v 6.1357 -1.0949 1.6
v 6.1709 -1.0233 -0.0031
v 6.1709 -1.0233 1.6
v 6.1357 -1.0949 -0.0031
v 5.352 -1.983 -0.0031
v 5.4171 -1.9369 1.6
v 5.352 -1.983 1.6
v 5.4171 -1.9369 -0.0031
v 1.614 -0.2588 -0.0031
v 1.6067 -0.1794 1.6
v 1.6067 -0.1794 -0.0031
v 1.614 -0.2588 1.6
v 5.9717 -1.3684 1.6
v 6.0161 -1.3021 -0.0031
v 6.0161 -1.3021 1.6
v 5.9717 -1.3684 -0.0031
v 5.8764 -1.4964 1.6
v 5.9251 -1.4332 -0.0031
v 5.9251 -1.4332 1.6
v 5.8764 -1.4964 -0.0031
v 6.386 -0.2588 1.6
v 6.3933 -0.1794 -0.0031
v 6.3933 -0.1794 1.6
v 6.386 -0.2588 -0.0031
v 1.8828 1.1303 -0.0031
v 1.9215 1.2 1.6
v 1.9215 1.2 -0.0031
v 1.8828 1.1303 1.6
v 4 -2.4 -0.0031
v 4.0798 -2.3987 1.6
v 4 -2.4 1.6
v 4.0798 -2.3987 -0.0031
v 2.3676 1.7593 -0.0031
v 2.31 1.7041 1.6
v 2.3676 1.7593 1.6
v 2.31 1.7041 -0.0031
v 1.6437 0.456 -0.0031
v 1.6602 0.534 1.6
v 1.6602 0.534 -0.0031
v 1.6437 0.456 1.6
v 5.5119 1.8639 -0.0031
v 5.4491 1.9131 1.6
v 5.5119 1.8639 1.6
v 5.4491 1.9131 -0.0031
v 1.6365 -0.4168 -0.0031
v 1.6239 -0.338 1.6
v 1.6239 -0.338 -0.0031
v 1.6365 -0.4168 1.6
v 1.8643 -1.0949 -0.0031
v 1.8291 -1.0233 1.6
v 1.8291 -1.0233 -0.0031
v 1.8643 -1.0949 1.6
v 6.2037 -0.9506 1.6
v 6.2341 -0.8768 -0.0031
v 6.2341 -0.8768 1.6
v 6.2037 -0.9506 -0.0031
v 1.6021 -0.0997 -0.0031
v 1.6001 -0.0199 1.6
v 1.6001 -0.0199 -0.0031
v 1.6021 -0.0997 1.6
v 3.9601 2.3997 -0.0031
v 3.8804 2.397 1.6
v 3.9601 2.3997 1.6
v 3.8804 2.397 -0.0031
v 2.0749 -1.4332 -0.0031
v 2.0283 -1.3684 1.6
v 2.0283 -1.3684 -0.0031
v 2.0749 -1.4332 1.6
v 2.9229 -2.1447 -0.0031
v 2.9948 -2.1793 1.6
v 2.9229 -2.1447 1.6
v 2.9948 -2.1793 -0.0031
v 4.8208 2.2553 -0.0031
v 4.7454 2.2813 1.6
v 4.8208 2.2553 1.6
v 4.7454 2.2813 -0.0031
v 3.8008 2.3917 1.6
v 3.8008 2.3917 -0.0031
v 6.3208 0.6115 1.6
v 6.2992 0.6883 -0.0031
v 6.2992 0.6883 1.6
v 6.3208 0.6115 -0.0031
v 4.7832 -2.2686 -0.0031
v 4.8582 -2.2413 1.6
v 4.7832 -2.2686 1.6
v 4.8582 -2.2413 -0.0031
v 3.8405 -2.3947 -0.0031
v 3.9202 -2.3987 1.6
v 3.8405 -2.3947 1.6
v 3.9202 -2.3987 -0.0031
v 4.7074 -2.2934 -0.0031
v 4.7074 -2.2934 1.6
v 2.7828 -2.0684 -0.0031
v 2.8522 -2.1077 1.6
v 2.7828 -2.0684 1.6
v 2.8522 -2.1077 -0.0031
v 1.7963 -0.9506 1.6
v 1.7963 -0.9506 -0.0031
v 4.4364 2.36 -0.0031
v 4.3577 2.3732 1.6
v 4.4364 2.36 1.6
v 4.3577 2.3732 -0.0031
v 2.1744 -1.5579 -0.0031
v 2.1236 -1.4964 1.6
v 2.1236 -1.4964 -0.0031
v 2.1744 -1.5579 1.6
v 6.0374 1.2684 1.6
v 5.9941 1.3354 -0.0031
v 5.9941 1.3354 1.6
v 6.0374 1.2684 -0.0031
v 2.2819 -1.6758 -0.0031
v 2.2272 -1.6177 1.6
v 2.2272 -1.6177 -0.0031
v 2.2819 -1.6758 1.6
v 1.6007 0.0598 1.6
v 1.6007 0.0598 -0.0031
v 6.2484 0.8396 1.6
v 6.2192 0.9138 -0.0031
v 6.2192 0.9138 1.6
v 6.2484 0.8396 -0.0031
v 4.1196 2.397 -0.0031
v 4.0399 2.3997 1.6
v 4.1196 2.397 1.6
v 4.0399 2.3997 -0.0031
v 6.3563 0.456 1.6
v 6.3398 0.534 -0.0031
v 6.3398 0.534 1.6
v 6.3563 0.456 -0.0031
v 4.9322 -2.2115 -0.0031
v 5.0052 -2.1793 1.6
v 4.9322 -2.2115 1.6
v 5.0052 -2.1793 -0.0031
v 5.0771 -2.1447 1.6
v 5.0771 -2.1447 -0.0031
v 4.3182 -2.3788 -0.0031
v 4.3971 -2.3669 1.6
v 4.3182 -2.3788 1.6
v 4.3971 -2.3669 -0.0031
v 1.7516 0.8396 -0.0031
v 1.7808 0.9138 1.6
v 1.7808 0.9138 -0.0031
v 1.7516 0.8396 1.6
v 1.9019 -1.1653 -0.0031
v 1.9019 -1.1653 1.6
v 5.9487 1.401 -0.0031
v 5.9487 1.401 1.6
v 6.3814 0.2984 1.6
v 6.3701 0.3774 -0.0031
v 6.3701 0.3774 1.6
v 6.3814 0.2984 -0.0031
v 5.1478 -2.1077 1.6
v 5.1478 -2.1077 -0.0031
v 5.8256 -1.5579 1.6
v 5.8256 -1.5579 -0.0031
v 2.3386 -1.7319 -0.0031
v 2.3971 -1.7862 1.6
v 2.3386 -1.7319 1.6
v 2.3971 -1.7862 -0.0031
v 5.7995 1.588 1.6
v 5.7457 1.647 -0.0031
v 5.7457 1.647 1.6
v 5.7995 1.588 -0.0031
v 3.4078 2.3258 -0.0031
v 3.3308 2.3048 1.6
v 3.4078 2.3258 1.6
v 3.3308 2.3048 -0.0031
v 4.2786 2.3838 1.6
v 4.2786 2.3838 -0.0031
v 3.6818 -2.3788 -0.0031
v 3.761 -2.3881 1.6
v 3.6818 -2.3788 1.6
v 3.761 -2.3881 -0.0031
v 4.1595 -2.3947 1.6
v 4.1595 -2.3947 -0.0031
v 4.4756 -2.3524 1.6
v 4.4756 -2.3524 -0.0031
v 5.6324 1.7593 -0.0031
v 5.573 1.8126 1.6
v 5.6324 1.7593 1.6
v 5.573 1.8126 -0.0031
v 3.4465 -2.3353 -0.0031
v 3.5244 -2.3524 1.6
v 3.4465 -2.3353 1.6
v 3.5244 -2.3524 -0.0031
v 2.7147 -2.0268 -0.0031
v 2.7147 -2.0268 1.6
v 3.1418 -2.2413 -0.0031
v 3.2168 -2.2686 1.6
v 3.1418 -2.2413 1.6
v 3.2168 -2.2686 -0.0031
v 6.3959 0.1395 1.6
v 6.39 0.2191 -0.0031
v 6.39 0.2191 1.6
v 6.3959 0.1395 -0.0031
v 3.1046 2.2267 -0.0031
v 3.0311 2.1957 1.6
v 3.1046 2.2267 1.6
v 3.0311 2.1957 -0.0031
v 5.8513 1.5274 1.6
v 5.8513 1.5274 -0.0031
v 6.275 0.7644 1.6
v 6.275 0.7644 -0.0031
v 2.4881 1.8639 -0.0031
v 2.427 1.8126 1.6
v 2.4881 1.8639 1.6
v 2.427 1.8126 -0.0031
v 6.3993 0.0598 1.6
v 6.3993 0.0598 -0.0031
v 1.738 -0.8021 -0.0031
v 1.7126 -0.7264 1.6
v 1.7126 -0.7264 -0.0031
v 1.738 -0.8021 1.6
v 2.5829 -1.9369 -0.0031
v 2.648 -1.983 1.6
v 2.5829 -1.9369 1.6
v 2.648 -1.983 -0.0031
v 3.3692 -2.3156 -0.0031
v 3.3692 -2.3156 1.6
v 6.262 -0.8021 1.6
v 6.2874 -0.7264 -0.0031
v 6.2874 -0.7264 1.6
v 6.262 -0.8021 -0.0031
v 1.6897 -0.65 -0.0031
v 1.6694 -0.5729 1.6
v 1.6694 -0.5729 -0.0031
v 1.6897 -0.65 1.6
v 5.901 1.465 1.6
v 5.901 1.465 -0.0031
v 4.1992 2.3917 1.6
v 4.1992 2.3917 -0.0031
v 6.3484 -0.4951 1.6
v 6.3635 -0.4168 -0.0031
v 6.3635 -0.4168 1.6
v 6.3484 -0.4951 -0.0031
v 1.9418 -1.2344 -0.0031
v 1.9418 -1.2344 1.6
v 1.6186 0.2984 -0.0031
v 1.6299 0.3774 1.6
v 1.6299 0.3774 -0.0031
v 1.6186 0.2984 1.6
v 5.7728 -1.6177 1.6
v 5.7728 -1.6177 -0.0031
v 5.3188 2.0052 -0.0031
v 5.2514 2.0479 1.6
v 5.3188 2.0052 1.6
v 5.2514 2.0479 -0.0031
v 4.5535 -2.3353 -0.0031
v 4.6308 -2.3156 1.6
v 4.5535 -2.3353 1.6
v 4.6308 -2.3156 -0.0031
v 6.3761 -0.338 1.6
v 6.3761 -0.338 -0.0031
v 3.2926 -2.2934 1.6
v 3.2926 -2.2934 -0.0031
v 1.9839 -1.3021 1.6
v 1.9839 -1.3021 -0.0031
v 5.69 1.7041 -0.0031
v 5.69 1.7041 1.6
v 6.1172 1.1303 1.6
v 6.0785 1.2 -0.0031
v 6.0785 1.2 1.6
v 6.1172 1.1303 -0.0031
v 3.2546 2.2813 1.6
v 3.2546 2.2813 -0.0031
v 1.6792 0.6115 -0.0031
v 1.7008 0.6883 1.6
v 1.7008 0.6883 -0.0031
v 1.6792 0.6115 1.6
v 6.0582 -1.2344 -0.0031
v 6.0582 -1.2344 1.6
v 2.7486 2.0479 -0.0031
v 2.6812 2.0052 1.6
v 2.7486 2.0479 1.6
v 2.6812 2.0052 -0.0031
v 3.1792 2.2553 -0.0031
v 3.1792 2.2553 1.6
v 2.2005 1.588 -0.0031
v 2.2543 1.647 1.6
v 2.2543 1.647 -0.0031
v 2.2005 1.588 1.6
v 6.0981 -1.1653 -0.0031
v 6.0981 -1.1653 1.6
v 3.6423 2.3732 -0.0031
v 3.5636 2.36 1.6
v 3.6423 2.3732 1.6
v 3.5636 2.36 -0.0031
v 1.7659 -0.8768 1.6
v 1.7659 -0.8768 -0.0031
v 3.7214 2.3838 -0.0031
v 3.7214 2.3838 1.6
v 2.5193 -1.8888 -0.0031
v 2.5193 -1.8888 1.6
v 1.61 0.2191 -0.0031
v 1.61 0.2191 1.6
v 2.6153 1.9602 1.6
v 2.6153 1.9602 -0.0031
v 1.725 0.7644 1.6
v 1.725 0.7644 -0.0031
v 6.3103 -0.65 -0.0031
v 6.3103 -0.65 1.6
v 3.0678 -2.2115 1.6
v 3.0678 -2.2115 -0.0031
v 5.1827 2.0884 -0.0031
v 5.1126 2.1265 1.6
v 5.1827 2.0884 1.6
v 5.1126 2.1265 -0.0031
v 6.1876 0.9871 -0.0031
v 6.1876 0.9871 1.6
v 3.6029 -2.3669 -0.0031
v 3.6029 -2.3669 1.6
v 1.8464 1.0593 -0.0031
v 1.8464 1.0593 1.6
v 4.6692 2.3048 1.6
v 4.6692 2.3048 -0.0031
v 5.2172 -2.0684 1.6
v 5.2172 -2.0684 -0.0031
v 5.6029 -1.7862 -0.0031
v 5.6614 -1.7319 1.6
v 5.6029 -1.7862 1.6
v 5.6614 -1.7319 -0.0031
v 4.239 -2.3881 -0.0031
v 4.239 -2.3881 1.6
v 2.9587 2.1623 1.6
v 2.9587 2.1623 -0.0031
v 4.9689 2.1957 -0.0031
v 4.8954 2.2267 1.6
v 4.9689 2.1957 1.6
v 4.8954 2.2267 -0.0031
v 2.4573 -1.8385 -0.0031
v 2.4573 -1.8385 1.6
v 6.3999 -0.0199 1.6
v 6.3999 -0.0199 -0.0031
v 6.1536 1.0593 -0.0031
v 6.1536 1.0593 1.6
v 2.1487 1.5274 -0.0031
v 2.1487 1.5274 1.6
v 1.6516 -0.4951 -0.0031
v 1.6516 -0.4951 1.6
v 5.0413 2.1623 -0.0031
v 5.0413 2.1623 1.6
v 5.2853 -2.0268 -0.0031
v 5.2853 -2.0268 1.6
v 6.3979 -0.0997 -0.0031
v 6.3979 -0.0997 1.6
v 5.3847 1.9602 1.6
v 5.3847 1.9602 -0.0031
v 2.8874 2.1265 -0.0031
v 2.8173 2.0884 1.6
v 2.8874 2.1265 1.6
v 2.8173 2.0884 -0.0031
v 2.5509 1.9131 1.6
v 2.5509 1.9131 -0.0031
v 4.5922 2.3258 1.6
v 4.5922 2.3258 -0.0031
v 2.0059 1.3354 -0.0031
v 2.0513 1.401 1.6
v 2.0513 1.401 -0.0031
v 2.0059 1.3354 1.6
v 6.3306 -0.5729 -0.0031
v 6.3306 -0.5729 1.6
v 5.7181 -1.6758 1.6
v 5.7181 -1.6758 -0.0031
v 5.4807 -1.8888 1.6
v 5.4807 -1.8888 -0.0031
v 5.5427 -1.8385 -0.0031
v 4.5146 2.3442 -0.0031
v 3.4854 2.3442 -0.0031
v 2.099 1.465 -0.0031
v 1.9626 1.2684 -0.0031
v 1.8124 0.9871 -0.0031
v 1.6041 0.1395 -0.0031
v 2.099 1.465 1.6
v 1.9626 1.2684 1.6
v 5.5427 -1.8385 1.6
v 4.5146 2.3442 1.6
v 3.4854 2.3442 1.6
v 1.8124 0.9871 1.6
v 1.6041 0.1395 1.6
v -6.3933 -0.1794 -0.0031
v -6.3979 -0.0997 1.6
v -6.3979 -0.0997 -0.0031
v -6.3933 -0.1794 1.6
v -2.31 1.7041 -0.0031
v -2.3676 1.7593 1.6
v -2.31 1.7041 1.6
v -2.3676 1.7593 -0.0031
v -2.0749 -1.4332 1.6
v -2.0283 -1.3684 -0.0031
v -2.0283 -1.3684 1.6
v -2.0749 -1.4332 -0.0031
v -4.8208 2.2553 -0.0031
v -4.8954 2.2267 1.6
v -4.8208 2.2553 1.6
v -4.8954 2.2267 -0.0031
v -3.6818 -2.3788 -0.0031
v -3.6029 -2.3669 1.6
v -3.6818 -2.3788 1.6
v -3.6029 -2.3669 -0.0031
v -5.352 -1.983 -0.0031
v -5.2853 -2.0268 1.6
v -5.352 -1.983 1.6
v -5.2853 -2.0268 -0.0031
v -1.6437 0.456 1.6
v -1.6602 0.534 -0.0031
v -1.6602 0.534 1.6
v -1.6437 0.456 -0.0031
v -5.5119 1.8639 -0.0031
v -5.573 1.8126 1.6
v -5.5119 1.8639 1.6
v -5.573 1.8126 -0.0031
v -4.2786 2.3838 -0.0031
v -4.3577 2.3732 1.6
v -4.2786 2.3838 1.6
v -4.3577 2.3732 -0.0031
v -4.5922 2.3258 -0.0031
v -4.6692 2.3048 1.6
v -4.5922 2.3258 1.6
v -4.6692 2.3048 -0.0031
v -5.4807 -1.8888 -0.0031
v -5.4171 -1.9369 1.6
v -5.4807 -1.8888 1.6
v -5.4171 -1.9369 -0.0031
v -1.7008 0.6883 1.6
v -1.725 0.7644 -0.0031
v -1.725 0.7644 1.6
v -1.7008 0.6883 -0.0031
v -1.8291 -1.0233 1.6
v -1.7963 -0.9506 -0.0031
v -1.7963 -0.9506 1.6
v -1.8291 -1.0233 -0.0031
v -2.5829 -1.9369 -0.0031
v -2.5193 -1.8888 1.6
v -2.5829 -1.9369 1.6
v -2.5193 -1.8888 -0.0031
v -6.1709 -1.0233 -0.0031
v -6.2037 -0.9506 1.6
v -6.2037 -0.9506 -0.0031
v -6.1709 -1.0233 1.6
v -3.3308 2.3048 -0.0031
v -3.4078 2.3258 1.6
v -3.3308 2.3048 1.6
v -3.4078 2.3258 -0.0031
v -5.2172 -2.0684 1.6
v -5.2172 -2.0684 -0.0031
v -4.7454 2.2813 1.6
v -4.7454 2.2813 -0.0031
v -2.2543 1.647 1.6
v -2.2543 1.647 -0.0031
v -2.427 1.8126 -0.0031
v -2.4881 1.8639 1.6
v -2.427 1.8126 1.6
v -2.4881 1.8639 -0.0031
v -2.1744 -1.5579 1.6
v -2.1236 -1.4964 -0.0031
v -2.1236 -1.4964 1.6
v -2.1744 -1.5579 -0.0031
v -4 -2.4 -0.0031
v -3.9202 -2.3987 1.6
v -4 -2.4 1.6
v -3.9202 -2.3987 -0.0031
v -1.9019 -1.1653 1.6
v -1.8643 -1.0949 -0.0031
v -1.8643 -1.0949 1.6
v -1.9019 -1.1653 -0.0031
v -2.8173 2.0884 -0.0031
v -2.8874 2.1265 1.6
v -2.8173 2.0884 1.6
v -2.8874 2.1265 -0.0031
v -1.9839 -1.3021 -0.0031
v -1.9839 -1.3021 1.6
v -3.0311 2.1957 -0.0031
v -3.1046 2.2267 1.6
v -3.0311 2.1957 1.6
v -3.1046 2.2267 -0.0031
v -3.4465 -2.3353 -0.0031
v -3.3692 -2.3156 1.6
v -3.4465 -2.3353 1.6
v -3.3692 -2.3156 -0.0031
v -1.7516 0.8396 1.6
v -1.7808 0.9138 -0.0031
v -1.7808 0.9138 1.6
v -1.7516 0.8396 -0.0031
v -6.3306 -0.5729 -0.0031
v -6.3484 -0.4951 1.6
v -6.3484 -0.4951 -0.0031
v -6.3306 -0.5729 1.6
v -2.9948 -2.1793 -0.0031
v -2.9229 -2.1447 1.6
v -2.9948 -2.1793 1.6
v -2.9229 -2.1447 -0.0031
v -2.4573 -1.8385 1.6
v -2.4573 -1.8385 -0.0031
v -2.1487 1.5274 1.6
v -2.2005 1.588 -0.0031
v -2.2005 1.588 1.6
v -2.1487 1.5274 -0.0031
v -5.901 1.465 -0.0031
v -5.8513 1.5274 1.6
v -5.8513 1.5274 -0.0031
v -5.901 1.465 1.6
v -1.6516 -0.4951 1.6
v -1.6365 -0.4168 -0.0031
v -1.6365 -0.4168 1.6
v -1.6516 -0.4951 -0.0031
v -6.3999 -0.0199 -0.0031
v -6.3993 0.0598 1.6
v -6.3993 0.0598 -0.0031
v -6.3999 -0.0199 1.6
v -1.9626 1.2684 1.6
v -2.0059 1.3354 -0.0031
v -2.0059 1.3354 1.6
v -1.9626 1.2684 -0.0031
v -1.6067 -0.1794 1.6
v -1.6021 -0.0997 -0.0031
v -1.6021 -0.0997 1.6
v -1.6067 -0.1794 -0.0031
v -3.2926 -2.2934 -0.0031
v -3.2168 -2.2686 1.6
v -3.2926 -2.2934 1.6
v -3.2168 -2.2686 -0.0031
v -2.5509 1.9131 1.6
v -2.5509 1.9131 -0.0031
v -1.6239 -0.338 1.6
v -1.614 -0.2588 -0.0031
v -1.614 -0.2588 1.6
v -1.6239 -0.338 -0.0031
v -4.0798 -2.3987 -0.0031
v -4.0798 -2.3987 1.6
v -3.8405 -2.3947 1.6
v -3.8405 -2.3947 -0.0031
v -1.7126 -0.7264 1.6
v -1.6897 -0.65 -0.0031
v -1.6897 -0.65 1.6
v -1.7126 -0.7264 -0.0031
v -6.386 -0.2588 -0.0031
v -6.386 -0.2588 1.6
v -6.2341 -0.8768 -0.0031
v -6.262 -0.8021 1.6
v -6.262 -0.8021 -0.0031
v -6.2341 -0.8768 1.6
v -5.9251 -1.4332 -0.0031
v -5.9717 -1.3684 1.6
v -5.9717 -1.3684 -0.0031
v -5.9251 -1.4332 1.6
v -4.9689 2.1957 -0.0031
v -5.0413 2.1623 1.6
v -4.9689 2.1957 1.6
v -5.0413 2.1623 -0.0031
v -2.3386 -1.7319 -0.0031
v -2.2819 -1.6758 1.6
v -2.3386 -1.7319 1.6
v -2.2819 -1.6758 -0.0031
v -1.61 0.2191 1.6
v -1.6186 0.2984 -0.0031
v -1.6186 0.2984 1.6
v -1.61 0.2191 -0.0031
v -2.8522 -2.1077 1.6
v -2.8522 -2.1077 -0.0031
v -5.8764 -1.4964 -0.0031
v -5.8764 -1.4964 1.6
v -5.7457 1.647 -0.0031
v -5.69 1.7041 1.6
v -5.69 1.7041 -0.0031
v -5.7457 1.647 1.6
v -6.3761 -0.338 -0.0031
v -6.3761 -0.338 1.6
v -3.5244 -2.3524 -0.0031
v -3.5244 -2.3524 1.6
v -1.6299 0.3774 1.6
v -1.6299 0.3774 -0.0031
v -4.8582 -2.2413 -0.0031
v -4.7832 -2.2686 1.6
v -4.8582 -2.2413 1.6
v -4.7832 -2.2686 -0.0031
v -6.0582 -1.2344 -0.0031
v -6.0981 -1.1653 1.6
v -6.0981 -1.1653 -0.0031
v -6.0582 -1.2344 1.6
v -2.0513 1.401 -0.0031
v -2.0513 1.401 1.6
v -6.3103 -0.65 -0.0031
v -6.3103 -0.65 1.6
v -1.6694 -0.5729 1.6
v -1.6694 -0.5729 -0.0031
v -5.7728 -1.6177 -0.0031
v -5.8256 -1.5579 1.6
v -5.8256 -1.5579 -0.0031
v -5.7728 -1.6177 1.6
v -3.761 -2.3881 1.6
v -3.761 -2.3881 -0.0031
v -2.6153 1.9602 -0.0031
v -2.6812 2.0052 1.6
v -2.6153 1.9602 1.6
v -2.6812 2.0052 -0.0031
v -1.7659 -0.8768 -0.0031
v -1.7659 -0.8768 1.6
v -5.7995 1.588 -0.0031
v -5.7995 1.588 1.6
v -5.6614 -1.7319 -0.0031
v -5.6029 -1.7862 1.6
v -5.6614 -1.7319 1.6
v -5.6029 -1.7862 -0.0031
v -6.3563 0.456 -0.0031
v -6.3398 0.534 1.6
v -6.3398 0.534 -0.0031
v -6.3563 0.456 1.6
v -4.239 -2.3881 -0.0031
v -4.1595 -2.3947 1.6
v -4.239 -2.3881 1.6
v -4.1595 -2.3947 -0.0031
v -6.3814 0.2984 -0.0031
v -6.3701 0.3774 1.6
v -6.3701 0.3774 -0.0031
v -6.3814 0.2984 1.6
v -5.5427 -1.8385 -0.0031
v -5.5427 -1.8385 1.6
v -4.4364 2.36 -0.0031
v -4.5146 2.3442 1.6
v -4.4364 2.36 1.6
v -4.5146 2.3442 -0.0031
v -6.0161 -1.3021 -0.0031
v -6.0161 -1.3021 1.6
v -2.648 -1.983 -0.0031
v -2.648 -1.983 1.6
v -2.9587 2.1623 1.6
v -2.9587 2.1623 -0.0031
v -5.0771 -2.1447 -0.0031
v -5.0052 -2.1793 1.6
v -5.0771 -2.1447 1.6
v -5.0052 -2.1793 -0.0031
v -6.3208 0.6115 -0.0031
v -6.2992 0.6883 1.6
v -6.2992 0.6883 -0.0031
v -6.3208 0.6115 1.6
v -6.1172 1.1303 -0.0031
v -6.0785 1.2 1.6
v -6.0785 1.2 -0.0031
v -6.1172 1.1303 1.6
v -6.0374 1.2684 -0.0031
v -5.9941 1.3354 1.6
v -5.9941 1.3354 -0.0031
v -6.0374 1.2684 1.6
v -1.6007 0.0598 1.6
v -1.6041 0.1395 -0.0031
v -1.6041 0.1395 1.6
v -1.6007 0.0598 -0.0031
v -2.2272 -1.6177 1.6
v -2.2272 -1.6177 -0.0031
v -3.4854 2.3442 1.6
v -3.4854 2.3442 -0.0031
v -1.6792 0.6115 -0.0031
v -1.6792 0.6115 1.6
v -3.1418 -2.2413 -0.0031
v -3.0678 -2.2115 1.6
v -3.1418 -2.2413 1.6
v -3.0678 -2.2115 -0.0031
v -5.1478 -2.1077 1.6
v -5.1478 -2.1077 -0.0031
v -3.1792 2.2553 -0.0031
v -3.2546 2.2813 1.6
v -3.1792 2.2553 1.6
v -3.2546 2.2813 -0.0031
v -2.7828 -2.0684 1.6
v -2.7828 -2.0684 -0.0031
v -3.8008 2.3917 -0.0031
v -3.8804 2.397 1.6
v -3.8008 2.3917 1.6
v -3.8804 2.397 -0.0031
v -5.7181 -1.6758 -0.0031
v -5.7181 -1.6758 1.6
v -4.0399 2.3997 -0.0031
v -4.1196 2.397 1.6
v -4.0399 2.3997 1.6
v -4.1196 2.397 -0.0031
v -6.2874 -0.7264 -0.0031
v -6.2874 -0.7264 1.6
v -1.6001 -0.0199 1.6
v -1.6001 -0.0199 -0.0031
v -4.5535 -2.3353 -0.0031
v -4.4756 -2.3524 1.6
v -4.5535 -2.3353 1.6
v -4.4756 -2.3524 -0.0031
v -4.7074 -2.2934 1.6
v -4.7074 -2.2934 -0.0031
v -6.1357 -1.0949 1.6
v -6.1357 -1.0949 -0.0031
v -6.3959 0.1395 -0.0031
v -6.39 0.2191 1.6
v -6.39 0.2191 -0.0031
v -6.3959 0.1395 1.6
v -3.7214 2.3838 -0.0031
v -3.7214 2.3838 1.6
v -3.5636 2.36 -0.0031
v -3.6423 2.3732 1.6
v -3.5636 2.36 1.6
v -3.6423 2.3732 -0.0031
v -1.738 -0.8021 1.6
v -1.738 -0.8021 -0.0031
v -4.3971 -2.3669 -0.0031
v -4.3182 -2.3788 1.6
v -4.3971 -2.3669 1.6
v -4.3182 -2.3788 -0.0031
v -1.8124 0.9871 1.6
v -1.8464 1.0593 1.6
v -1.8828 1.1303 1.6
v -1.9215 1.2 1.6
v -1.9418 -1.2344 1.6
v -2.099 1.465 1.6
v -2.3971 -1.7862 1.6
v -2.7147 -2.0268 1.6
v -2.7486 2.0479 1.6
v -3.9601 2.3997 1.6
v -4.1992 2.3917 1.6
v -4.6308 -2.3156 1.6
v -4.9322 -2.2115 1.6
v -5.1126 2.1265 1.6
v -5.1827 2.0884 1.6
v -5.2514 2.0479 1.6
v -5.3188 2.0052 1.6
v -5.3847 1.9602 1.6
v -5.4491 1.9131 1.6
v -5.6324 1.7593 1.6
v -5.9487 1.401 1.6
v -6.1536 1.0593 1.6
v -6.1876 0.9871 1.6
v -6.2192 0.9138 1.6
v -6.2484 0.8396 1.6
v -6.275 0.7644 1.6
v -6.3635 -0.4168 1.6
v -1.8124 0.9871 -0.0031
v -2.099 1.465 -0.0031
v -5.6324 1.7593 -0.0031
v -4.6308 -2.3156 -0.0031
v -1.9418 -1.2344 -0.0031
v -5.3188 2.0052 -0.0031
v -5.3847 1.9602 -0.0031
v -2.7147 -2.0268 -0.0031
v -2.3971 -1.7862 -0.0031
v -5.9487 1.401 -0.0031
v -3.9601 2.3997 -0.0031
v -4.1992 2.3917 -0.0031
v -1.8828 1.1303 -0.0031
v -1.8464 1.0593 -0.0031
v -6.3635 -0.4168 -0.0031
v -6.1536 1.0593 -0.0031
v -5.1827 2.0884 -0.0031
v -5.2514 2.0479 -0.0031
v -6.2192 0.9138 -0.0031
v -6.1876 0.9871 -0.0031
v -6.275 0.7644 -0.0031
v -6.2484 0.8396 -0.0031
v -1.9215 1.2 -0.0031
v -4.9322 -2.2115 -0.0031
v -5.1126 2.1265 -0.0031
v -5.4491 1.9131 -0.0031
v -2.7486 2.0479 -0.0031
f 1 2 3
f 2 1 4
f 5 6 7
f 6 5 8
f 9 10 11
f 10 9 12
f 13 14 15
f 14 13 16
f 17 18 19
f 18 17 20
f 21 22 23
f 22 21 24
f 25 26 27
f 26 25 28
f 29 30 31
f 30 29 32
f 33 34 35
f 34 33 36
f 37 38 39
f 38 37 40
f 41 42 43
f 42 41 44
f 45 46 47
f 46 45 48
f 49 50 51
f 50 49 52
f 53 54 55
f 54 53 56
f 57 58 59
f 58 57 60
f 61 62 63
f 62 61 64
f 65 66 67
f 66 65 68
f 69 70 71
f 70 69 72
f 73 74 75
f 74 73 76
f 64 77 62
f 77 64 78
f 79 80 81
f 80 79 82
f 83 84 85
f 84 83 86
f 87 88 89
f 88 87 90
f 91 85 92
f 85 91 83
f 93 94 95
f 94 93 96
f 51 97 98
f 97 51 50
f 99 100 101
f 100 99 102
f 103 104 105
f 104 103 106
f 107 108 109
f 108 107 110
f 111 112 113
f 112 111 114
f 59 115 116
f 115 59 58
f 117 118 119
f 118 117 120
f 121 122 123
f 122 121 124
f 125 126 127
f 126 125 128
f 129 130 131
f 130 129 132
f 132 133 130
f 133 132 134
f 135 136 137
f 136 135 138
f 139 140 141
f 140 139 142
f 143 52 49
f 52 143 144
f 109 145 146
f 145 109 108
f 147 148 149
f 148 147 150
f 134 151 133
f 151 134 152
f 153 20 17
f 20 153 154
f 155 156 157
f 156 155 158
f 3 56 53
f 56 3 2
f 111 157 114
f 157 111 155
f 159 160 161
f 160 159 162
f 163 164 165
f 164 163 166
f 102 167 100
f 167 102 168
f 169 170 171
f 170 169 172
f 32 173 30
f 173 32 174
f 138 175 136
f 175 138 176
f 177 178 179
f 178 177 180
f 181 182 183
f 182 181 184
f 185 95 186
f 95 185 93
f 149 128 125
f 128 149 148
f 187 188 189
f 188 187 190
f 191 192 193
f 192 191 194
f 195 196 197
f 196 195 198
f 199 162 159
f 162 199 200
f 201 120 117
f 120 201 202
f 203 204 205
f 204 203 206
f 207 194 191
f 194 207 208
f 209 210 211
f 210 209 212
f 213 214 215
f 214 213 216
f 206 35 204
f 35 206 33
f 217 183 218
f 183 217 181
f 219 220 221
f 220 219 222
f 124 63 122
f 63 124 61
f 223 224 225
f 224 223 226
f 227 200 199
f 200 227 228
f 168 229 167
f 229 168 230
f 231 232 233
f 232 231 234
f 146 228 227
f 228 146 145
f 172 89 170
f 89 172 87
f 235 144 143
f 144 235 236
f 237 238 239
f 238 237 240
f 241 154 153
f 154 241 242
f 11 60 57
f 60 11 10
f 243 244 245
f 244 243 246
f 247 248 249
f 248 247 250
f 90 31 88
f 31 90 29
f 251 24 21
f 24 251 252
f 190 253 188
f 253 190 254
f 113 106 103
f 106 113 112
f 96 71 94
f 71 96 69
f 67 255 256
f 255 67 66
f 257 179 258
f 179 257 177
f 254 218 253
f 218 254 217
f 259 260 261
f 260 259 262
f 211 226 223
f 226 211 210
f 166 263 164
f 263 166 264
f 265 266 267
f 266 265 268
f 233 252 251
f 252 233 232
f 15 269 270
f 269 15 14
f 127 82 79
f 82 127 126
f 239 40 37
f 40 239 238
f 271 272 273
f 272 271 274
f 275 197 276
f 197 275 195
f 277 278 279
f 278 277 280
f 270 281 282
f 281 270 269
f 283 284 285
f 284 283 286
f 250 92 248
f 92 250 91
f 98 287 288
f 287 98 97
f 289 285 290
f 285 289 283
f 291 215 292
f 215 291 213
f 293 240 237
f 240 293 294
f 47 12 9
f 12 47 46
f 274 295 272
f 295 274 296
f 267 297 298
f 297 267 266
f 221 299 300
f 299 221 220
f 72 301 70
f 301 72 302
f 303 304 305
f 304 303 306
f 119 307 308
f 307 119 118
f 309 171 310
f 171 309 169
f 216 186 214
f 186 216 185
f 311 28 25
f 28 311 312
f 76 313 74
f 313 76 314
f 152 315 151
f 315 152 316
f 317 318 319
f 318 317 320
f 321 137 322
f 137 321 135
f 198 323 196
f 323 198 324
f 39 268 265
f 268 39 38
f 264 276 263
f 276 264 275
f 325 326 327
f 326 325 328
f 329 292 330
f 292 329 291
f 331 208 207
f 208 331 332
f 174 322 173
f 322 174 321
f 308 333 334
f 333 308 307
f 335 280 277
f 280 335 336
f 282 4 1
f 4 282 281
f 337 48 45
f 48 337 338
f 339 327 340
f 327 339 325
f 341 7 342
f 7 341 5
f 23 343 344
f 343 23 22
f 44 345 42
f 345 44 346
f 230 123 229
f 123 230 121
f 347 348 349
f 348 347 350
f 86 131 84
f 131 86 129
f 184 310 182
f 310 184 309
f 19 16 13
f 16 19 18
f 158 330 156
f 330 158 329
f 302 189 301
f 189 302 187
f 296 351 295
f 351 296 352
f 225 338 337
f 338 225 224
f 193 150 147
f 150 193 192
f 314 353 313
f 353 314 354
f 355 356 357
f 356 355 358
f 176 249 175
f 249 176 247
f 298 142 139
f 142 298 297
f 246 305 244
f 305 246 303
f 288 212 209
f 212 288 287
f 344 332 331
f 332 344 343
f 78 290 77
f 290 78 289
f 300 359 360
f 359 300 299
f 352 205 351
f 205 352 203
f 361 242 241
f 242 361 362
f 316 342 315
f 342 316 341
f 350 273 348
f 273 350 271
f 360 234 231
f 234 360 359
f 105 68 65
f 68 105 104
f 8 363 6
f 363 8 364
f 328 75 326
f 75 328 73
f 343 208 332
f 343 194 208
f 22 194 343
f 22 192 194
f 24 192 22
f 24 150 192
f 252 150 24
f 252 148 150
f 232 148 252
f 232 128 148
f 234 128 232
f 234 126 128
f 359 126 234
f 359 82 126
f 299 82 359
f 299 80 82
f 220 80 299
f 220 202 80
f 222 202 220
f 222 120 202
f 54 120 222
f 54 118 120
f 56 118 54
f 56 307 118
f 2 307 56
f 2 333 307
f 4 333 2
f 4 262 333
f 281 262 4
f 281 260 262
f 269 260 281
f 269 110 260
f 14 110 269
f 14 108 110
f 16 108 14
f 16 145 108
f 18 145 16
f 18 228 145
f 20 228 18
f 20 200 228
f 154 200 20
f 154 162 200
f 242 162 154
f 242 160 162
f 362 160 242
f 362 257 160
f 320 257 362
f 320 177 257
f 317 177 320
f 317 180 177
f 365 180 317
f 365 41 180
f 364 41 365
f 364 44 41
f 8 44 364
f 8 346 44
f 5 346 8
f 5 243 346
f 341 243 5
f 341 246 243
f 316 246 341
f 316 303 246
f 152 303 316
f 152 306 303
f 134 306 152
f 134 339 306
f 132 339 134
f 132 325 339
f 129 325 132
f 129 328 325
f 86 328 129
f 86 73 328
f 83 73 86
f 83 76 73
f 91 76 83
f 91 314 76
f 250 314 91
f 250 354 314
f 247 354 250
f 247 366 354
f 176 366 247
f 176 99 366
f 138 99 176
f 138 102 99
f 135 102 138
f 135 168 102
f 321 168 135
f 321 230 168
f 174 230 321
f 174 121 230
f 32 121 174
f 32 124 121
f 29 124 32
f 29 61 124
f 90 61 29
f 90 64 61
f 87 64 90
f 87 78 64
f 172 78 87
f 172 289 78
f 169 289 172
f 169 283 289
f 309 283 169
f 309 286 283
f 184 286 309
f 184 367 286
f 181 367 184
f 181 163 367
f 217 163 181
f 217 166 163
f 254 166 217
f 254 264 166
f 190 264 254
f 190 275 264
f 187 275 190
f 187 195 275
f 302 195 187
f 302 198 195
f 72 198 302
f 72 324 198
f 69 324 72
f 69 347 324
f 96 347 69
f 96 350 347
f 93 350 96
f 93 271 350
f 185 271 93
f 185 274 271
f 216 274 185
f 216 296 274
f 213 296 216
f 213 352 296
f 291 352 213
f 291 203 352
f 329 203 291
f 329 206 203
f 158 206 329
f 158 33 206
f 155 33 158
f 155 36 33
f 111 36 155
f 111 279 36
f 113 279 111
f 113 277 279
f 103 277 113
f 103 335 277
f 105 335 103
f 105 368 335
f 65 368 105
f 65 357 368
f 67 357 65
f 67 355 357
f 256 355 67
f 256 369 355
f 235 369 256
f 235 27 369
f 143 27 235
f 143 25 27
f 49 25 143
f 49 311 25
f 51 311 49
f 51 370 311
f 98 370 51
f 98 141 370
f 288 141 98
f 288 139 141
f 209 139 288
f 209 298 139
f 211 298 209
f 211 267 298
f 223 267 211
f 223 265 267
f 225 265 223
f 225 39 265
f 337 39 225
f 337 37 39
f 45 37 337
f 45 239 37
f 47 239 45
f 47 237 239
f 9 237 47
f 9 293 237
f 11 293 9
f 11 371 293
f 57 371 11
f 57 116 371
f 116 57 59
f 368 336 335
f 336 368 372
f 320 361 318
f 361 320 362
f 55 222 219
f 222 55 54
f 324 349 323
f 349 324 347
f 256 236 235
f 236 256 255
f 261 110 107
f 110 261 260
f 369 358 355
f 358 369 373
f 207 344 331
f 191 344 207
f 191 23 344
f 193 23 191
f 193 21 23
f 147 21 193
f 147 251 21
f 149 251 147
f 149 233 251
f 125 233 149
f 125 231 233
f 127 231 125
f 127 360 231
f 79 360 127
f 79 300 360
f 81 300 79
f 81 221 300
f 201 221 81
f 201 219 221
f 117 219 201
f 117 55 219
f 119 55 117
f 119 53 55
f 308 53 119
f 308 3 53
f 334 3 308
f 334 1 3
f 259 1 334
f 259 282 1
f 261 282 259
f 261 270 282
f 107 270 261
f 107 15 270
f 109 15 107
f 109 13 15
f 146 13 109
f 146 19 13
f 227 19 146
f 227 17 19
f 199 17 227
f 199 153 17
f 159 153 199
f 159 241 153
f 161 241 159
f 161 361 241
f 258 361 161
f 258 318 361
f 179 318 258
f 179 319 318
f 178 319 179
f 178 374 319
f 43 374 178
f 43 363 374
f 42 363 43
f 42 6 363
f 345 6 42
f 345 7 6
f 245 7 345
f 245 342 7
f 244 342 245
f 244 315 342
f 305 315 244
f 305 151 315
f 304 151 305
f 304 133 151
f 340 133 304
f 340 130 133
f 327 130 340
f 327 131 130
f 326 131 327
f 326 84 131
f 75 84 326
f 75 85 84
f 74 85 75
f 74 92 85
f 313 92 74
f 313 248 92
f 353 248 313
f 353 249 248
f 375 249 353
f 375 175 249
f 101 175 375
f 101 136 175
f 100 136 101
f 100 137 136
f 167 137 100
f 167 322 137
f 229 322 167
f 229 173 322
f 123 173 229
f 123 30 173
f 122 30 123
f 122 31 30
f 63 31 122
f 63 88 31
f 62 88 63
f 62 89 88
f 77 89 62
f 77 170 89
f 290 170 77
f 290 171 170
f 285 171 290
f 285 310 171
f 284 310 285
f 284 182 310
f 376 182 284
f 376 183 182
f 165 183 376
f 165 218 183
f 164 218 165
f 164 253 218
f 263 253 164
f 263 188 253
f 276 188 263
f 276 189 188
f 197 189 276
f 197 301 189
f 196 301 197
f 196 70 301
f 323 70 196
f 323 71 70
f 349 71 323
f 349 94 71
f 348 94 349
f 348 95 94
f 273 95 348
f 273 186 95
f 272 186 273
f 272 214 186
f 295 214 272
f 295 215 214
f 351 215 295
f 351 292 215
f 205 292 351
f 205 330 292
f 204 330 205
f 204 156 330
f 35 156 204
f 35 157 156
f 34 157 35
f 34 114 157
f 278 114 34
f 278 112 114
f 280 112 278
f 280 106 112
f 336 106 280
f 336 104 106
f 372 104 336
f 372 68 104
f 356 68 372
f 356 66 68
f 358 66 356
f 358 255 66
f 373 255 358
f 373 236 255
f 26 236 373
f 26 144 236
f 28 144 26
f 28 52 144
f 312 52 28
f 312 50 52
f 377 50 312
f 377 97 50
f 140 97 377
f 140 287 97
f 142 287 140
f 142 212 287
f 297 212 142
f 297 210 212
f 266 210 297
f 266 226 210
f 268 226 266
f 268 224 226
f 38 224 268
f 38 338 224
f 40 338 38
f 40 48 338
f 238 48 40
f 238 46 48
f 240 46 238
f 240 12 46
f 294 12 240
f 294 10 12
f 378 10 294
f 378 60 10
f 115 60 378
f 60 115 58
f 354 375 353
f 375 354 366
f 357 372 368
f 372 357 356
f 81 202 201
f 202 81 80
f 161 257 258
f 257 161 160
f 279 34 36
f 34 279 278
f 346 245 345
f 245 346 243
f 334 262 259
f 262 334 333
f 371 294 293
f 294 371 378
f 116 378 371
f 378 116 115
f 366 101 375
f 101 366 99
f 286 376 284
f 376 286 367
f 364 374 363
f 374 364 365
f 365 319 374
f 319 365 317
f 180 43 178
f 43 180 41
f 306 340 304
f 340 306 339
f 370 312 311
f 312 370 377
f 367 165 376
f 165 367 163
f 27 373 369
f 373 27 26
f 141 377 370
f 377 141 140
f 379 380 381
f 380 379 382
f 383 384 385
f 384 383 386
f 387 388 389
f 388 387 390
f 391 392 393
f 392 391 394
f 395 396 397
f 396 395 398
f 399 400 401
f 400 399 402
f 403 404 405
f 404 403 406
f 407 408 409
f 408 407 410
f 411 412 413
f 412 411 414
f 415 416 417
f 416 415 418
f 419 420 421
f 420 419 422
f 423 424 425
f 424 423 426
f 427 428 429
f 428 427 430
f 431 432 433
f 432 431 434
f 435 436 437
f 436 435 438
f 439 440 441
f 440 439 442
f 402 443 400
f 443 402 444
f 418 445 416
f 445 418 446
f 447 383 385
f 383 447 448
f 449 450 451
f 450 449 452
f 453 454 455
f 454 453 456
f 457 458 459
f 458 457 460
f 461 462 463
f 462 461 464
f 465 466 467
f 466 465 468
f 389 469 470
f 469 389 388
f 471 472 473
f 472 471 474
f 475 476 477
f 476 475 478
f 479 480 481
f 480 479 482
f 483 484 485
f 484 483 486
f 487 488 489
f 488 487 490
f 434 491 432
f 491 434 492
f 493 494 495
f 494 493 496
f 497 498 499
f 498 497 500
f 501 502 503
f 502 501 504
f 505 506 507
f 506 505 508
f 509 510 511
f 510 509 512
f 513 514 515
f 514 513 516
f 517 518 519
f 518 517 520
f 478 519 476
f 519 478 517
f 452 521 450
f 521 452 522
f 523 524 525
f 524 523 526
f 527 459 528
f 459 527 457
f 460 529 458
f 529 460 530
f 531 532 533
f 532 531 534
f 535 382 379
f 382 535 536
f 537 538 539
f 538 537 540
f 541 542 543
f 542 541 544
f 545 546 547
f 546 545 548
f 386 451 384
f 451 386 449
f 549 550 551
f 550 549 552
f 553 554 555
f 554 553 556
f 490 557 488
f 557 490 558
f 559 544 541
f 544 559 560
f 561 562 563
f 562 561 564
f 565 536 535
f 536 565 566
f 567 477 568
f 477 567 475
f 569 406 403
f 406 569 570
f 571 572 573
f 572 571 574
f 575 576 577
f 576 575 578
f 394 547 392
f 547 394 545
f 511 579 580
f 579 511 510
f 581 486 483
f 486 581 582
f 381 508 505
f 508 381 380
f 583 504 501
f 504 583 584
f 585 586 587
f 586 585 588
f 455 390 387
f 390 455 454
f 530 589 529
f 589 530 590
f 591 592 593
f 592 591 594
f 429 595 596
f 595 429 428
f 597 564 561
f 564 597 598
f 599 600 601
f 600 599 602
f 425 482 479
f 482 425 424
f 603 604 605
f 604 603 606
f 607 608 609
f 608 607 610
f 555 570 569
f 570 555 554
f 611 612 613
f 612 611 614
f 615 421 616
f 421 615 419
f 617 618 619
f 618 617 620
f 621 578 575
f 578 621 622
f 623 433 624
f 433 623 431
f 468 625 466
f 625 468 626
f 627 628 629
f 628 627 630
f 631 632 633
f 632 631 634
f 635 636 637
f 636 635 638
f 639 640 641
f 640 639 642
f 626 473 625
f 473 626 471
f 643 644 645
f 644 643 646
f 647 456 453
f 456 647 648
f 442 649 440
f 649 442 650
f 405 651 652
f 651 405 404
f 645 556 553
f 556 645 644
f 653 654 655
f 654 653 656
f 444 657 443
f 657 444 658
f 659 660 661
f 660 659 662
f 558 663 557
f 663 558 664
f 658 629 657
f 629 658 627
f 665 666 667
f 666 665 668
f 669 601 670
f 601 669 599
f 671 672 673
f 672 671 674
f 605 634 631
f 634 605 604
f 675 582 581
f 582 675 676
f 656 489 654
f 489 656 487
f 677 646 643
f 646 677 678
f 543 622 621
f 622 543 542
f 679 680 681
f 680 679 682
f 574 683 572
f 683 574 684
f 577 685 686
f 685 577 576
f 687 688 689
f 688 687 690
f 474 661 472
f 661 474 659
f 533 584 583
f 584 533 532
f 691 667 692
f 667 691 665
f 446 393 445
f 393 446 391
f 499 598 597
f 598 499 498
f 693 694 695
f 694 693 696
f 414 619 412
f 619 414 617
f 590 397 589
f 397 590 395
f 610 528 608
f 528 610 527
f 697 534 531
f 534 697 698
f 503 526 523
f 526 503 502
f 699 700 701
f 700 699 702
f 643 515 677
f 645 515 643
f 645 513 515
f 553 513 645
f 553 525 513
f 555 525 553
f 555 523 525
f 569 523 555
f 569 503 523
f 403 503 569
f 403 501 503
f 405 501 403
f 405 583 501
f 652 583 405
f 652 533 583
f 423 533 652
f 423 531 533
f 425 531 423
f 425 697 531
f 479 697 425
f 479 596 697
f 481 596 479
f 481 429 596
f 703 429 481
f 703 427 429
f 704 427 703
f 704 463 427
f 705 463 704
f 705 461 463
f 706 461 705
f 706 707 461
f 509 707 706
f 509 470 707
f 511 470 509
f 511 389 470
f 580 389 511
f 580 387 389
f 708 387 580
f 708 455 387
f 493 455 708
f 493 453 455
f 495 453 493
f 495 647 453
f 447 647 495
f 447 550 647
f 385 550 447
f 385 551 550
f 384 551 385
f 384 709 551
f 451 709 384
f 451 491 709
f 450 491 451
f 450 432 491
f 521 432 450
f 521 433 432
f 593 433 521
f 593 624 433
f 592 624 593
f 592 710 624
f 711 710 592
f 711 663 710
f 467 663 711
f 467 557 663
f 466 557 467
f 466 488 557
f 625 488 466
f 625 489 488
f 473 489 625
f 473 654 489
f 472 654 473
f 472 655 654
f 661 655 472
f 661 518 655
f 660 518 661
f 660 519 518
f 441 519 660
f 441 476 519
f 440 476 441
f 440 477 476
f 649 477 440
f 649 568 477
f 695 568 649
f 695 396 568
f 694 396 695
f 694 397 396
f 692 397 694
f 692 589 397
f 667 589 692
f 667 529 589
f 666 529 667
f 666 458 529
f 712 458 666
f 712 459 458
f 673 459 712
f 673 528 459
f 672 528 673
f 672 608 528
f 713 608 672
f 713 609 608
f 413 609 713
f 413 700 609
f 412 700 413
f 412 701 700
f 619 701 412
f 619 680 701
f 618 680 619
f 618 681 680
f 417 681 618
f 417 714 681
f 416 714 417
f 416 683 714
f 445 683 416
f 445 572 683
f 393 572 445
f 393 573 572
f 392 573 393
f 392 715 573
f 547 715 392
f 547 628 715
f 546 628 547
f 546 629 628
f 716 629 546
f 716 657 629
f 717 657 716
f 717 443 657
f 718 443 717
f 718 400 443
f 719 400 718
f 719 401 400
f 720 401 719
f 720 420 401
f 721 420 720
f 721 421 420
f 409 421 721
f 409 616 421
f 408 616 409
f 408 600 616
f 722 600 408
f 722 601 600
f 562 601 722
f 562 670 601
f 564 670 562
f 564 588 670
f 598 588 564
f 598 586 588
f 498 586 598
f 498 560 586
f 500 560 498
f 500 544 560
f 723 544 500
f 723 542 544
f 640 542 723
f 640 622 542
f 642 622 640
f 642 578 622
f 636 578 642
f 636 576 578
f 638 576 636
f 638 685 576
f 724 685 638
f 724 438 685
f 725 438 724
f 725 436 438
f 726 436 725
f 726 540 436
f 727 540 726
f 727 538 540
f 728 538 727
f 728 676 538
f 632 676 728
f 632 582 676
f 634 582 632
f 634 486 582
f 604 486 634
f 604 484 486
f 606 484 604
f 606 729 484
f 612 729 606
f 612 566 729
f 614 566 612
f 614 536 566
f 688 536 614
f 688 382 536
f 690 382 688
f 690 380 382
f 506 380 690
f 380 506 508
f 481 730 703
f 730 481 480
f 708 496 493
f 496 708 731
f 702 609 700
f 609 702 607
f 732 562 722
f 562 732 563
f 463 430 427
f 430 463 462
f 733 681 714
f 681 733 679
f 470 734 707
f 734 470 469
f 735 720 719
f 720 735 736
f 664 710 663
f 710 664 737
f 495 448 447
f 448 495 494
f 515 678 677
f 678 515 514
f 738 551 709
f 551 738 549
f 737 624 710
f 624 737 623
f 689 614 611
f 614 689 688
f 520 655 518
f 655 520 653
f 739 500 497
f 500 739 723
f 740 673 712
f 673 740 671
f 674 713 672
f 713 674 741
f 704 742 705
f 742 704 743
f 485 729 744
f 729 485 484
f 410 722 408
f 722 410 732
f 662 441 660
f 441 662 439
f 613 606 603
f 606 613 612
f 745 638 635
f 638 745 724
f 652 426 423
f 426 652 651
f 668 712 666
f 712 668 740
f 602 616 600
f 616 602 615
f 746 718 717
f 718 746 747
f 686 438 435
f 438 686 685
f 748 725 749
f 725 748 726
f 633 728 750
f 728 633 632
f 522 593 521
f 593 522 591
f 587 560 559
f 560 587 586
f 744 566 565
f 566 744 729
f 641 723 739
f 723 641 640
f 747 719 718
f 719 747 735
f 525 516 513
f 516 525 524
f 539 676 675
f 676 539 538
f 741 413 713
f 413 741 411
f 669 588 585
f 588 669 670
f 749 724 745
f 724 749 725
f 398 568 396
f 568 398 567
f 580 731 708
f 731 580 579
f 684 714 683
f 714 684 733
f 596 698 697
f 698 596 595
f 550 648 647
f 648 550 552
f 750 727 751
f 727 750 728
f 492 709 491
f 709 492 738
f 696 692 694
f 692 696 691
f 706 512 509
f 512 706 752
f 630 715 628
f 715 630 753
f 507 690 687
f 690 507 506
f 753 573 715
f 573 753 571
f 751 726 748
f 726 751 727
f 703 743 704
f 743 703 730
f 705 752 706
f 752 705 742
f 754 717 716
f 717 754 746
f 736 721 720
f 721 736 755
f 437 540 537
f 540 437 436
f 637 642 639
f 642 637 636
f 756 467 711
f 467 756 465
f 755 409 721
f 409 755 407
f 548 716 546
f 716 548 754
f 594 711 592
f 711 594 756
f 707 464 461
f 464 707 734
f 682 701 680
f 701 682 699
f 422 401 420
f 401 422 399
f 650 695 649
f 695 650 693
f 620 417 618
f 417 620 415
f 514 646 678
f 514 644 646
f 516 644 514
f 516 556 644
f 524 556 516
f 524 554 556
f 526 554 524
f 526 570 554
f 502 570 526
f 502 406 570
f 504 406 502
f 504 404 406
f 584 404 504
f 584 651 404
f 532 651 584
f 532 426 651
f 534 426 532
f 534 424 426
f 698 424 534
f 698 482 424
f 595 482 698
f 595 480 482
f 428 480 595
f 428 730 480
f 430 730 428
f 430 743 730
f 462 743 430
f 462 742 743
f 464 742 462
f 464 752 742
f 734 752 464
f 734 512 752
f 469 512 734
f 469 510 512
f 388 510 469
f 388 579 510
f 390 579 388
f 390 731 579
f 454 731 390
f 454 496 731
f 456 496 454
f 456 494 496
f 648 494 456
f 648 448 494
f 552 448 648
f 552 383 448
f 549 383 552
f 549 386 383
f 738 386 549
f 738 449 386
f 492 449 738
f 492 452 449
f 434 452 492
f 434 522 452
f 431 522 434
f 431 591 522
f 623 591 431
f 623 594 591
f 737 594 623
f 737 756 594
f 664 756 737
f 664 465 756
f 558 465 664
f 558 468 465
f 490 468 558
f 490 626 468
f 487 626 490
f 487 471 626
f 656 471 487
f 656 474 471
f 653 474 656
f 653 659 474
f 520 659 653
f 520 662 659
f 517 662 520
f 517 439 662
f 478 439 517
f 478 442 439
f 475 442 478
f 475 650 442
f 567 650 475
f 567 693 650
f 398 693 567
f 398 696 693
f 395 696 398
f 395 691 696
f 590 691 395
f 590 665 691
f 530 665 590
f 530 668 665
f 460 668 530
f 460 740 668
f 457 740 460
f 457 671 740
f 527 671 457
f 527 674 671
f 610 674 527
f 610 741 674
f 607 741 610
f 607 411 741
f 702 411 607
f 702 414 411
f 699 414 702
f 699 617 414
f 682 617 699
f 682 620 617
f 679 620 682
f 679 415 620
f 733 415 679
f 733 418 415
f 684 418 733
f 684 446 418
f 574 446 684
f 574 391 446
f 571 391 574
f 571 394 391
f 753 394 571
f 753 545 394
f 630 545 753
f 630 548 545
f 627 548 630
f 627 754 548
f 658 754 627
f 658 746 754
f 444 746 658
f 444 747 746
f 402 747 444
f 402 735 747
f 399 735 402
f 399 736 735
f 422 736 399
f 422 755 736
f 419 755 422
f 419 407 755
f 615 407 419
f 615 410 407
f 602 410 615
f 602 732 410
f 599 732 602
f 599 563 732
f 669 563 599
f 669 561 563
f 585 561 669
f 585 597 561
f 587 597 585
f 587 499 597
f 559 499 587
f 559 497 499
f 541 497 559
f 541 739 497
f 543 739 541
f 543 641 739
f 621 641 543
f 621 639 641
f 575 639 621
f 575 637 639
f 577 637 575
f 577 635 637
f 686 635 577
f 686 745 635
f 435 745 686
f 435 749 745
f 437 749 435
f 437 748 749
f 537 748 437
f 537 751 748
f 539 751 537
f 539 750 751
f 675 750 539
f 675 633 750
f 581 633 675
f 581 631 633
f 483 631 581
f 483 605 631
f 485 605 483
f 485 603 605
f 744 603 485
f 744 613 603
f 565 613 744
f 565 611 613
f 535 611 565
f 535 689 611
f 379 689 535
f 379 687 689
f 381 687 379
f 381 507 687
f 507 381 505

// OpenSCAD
use <../lib.scad>
use <../p/2-4cyli.scad>
use <../p/2-4edge.scad>
use <../p/2-4ndis.scad>
use <../p/4-4edge.scad>
use <../p/rect.scad>
use <../p/rect2p.scad>
use <../p/rect3.scad>
use <../p/stud.scad>
$fa=1; $fs=0.2;
function ldraw_lib__389(realsolid=false) = [
// 0 Technic Brick  1 x  2 with Hole and Thin Top
// 0 Name: 389.dat
// 0 Author: Niels Karsdorp [nielsk]
// 0 !LDRAW_ORG Part UPDATE 2009-03
// 0 !LICENSE Licensed under CC BY 2.0 and CC BY 4.0 : see CAreadme.txt
// 
// 0 BFC CERTIFY CW
  [0,"BFC","CERTIFY"],
  [0,"BFC","CW"],
// 
// 0 !HISTORY 2009-12-29 [PTadmin] Official Update 2009-03
// 
// 
// 0 // Inner details
// 
// 1 16 6.5 12 5.5 0.5 0 0 0 -1 0 0 0 0.5 rect.dat
  [1,16,6.5,12,5.5,0.5,0,0,0,-1,0,0,0,0.5, ldraw_lib__rect(realsolid)],
// 1 16 6.5 12 -5.5 0.5 0 0 0 -1 0 0 0 0.5 rect.dat
  [1,16,6.5,12,-5.5,0.5,0,0,0,-1,0,0,0,0.5, ldraw_lib__rect(realsolid)],
// 1 16 -6.5 12 5.5 0.5 0 0 0 -1 0 0 0 0.5 rect.dat
  [1,16,-6.5,12,5.5,0.5,0,0,0,-1,0,0,0,0.5, ldraw_lib__rect(realsolid)],
// 1 16 -6.5 12 -5.5 0.5 0 0 0 -1 0 0 0 0.5 rect.dat
  [1,16,-6.5,12,-5.5,0.5,0,0,0,-1,0,0,0,0.5, ldraw_lib__rect(realsolid)],
// 1 16 7 8 5.5 0 -1 0 0 0 -4 0.5 0 0 rect3.dat
  [1,16,7,8,5.5,0,-1,0,0,0,-4,0.5,0,0, ldraw_lib__rect3(realsolid)],
// 1 16 7 8 -5.5 0 -1 0 0 0 -4 0.5 0 0 rect3.dat
  [1,16,7,8,-5.5,0,-1,0,0,0,-4,0.5,0,0, ldraw_lib__rect3(realsolid)],
// 1 16 -7 8 5.5 0 1 0 0 0 -4 0.5 0 0 rect3.dat
  [1,16,-7,8,5.5,0,1,0,0,0,-4,0.5,0,0, ldraw_lib__rect3(realsolid)],
// 1 16 -7 8 -5.5 0 1 0 0 0 -4 0.5 0 0 rect3.dat
  [1,16,-7,8,-5.5,0,1,0,0,0,-4,0.5,0,0, ldraw_lib__rect3(realsolid)],
// 1 16 0 10 5 6 0 0 0 0 -6 0 1 0 2-4edge.dat
  [1,16,0,10,5,6,0,0,0,0,-6,0,1,0, ldraw_lib__2_4edge(realsolid)],
// 1 16 0 10 -5 6 0 0 0 0 -6 0 1 0 2-4edge.dat
  [1,16,0,10,-5,6,0,0,0,0,-6,0,1,0, ldraw_lib__2_4edge(realsolid)],
// 1 16 6 11 5.5 0 1 0 1 0 0 0 0 0.5 rect2p.dat
  [1,16,6,11,5.5,0,1,0,1,0,0,0,0,0.5, ldraw_lib__rect2p(realsolid)],
// 1 16 6 11 -5.5 0 1 0 1 0 0 0 0 0.5 rect2p.dat
  [1,16,6,11,-5.5,0,1,0,1,0,0,0,0,0.5, ldraw_lib__rect2p(realsolid)],
// 1 16 -6 11 5.5 0 -1 0 1 0 0 0 0 0.5 rect2p.dat
  [1,16,-6,11,5.5,0,-1,0,1,0,0,0,0,0.5, ldraw_lib__rect2p(realsolid)],
// 1 16 -6 11 -5.5 0 -1 0 1 0 0 0 0 0.5 rect2p.dat
  [1,16,-6,11,-5.5,0,-1,0,1,0,0,0,0,0.5, ldraw_lib__rect2p(realsolid)],
// 4 16 7 12 5 6 12 5 6 4 5 7 4 5
  [4,16,7,12,5,6,12,5,6,4,5,7,4,5],
// 4 16 7 4 -5 6 4 -5 6 12 -5 7 12 -5
  [4,16,7,4,-5,6,4,-5,6,12,-5,7,12,-5],
// 4 16 -6 12 5 -7 12 5 -7 4 5 -6 4 5
  [4,16,-6,12,5,-7,12,5,-7,4,5,-6,4,5],
// 4 16 -6 4 -5 -7 4 -5 -7 12 -5 -6 12 -5
  [4,16,-6,4,-5,-7,4,-5,-7,12,-5,-6,12,-5],
// 0 BFC INVERTNEXT
  [0,"BFC","INVERTNEXT"],
// 1 16 0 10 6 6 0 0 0 0 -6 0 -1 0 2-4cyli.dat
  [1,16,0,10,6,6,0,0,0,0,-6,0,-1,0, ldraw_lib__2_4cyli(realsolid)],
// 0 BFC INVERTNEXT
  [0,"BFC","INVERTNEXT"],
// 1 16 0 10 -6 6 0 0 0 0 -6 0 1 0 2-4cyli.dat
  [1,16,0,10,-6,6,0,0,0,0,-6,0,1,0, ldraw_lib__2_4cyli(realsolid)],
// 1 16 0 10 5 6 0 0 0 0 -6 0 1 0 2-4ndis.dat
  [1,16,0,10,5,6,0,0,0,0,-6,0,1,0, ldraw_lib__2_4ndis(realsolid)],
// 1 16 0 10 -5 6 0 0 0 0 -6 0 -1 0 2-4ndis.dat
  [1,16,0,10,-5,6,0,0,0,0,-6,0,-1,0, ldraw_lib__2_4ndis(realsolid)],
// 1 16 0 10 6 6 0 0 0 0 6 0 1 0 4-4edge.dat
  [1,16,0,10,6,6,0,0,0,0,6,0,1,0, ldraw_lib__4_4edge(realsolid)],
// 1 16 0 10 -6 6 0 0 0 0 6 0 1 0 4-4edge.dat
  [1,16,0,10,-6,6,0,0,0,0,6,0,1,0, ldraw_lib__4_4edge(realsolid)],
// 0 // Inner sides
// 1 16 16 14 0 0 1 0 10 0 0 0 0 6 rect.dat
  [1,16,16,14,0,0,1,0,10,0,0,0,0,6, ldraw_lib__rect(realsolid)],
// 1 16 -16 14 0 0 -1 0 10 0 0 0 0 6 rect.dat
  [1,16,-16,14,0,0,-1,0,10,0,0,0,0,6, ldraw_lib__rect(realsolid)],
// 1 16 11.5 4 0 4.5 0 0 0 -1 0 0 0 6 rect2p.dat
  [1,16,11.5,4,0,4.5,0,0,0,-1,0,0,0,6, ldraw_lib__rect2p(realsolid)],
// 1 16 0 4 0 7 0 0 0 -1 0 0 0 5 rect2p.dat
  [1,16,0,4,0,7,0,0,0,-1,0,0,0,5, ldraw_lib__rect2p(realsolid)],
// 1 16 -11.5 4 0 4.5 0 0 0 -1 0 0 0 6 rect2p.dat
  [1,16,-11.5,4,0,4.5,0,0,0,-1,0,0,0,6, ldraw_lib__rect2p(realsolid)],
// 1 16 0 10 6 6 0 0 0 0 6 0 1 0 2-4ndis.dat
  [1,16,0,10,6,6,0,0,0,0,6,0,1,0, ldraw_lib__2_4ndis(realsolid)],
// 1 16 0 10 -6 6 0 0 0 0 6 0 -1 0 2-4ndis.dat
  [1,16,0,10,-6,6,0,0,0,0,6,0,-1,0, ldraw_lib__2_4ndis(realsolid)],
// 4 16 -7 12 6 -16 24 6 -16 4 6 -7 4 6
  [4,16,-7,12,6,-16,24,6,-16,4,6,-7,4,6],
// 4 16 -7 12 6 -6 12 6 -6 16 6 -16 24 6
  [4,16,-7,12,6,-6,12,6,-6,16,6,-16,24,6],
// 4 16 16 24 6 7 12 6 7 4 6 16 4 6
  [4,16,16,24,6,7,12,6,7,4,6,16,4,6],
// 4 16 16 24 6 6 16 6 6 12 6 7 12 6
  [4,16,16,24,6,6,16,6,6,12,6,7,12,6],
// 4 16 16 24 6 -16 24 6 -6 16 6 6 16 6
  [4,16,16,24,6,-16,24,6,-6,16,6,6,16,6],
// 4 16 -7 4 -6 -16 4 -6 -16 24 -6 -7 12 -6
  [4,16,-7,4,-6,-16,4,-6,-16,24,-6,-7,12,-6],
// 4 16 -16 24 -6 -6 16 -6 -6 12 -6 -7 12 -6
  [4,16,-16,24,-6,-6,16,-6,-6,12,-6,-7,12,-6],
// 4 16 16 4 -6 7 4 -6 7 12 -6 16 24 -6
  [4,16,16,4,-6,7,4,-6,7,12,-6,16,24,-6],
// 4 16 7 12 -6 6 12 -6 6 16 -6 16 24 -6
  [4,16,7,12,-6,6,12,-6,6,16,-6,16,24,-6],
// 4 16 6 16 -6 -6 16 -6 -16 24 -6 16 24 -6
  [4,16,6,16,-6,-6,16,-6,-16,24,-6,16,24,-6],
// 2 24 -16 24 -6 16 24 -6
  [2,24,-16,24,-6,16,24,-6],
// 2 24 16 24 6 -16 24 6
  [2,24,16,24,6,-16,24,6],
// 0 // Outer details
// 1 16 6 5 8 0 1 0 0 0 -5 2 0 0 rect3.dat
  [1,16,6,5,8,0,1,0,0,0,-5,2,0,0, ldraw_lib__rect3(realsolid)],
// 1 16 6 5 -8 0 1 0 0 0 -5 2 0 0 rect3.dat
  [1,16,6,5,-8,0,1,0,0,0,-5,2,0,0, ldraw_lib__rect3(realsolid)],
// 1 16 -6 5 8 0 -1 0 0 0 -5 2 0 0 rect3.dat
  [1,16,-6,5,8,0,-1,0,0,0,-5,2,0,0, ldraw_lib__rect3(realsolid)],
// 1 16 -6 5 -8 0 -1 0 0 0 -5 2 0 0 rect3.dat
  [1,16,-6,5,-8,0,-1,0,0,0,-5,2,0,0, ldraw_lib__rect3(realsolid)],
// 0 BFC INVERTNEXT
  [0,"BFC","INVERTNEXT"],
// 1 16 0 10 10 6 0 0 0 0 6 0 -4 0 2-4cyli.dat
  [1,16,0,10,10,6,0,0,0,0,6,0,-4,0, ldraw_lib__2_4cyli(realsolid)],
// 0 BFC INVERTNEXT
  [0,"BFC","INVERTNEXT"],
// 1 16 0 10 -10 6 0 0 0 0 6 0 4 0 2-4cyli.dat
  [1,16,0,10,-10,6,0,0,0,0,6,0,4,0, ldraw_lib__2_4cyli(realsolid)],
// 1 16 0 10 10 6 0 0 0 0 6 0 1 0 2-4edge.dat
  [1,16,0,10,10,6,0,0,0,0,6,0,1,0, ldraw_lib__2_4edge(realsolid)],
// 1 16 0 10 -10 6 0 0 0 0 6 0 1 0 2-4edge.dat
  [1,16,0,10,-10,6,0,0,0,0,6,0,1,0, ldraw_lib__2_4edge(realsolid)],
// 1 16 0 10 6 6 0 0 0 0 -6 0 -1 0 2-4ndis.dat
  [1,16,0,10,6,6,0,0,0,0,-6,0,-1,0, ldraw_lib__2_4ndis(realsolid)],
// 1 16 0 10 -6 6 0 0 0 0 -6 0 1 0 2-4ndis.dat
  [1,16,0,10,-6,6,0,0,0,0,-6,0,1,0, ldraw_lib__2_4ndis(realsolid)],
// 4 16 -6 4 6 6 4 6 6 0 6 -6 0 6
  [4,16,-6,4,6,6,4,6,6,0,6,-6,0,6],
// 4 16 -6 0 -6 6 0 -6 6 4 -6 -6 4 -6
  [4,16,-6,0,-6,6,0,-6,6,4,-6,-6,4,-6],
// 0 // Outer sides
// 1 16 -20 12 0 0 1 0 12 0 0 0 0 10 rect.dat
  [1,16,-20,12,0,0,1,0,12,0,0,0,0,10, ldraw_lib__rect(realsolid)],
// 1 16 20 12 0 0 -1 0 12 0 0 0 0 10 rect.dat
  [1,16,20,12,0,0,-1,0,12,0,0,0,0,10, ldraw_lib__rect(realsolid)],
// 1 16 0 10 10 6 0 0 0 0 6 0 -1 0 2-4ndis.dat
  [1,16,0,10,10,6,0,0,0,0,6,0,-1,0, ldraw_lib__2_4ndis(realsolid)],
// 1 16 0 10 -10 6 0 0 0 0 6 0 1 0 2-4ndis.dat
  [1,16,0,10,-10,6,0,0,0,0,6,0,1,0, ldraw_lib__2_4ndis(realsolid)],
// 4 16 20 0 10 6 0 10 6 16 10 20 24 10
  [4,16,20,0,10,6,0,10,6,16,10,20,24,10],
// 4 16 -20 0 -10 -6 0 -10 -6 16 -10 -20 24 -10
  [4,16,-20,0,-10,-6,0,-10,-6,16,-10,-20,24,-10],
// 4 16 6 0 -10 20 0 -10 20 24 -10 6 16 -10
  [4,16,6,0,-10,20,0,-10,20,24,-10,6,16,-10],
// 4 16 -6 0 10 -20 0 10 -20 24 10 -6 16 10
  [4,16,-6,0,10,-20,0,10,-20,24,10,-6,16,10],
// 4 16 6 16 10 -6 16 10 -20 24 10 20 24 10
  [4,16,6,16,10,-6,16,10,-20,24,10,20,24,10],
// 4 16 -6 16 -10 6 16 -10 20 24 -10 -20 24 -10
  [4,16,-6,16,-10,6,16,-10,20,24,-10,-20,24,-10],
// 2 24 -20 24 -10 20 24 -10
  [2,24,-20,24,-10,20,24,-10],
// 2 24 -20 24 10 20 24 10
  [2,24,-20,24,10,20,24,10],
// 0 // Top & bottom sides
// 1 16 13 0 0 7 0 0 0 1 0 0 0 10 rect2p.dat
  [1,16,13,0,0,7,0,0,0,1,0,0,0,10, ldraw_lib__rect2p(realsolid)],
// 1 16 0 0 0 6 0 0 0 1 0 0 0 6 rect2p.dat
  [1,16,0,0,0,6,0,0,0,1,0,0,0,6, ldraw_lib__rect2p(realsolid)],
// 1 16 -13 0 0 7 0 0 0 1 0 0 0 10 rect2p.dat
  [1,16,-13,0,0,7,0,0,0,1,0,0,0,10, ldraw_lib__rect2p(realsolid)],
// 4 16 16 24 6 20 24 10 -20 24 10 -16 24 6
  [4,16,16,24,6,20,24,10,-20,24,10,-16,24,6],
// 4 16 -20 24 -10 20 24 -10 16 24 -6 -16 24 -6
  [4,16,-20,24,-10,20,24,-10,16,24,-6,-16,24,-6],
// 4 16 20 24 -10 20 24 10 16 24 6 16 24 -6
  [4,16,20,24,-10,20,24,10,16,24,6,16,24,-6],
// 4 16 -16 24 6 -20 24 10 -20 24 -10 -16 24 -6
  [4,16,-16,24,6,-20,24,10,-20,24,-10,-16,24,-6],
// 1 16 10 0 0 1 0 0 0 1 0 0 0 1 stud.dat
  [1,16,10,0,0,1,0,0,0,1,0,0,0,1, ldraw_lib__stud(realsolid)],
// 1 16 -10 0 0 1 0 0 0 1 0 0 0 1 stud.dat
  [1,16,-10,0,0,1,0,0,0,1,0,0,0,1, ldraw_lib__stud(realsolid)],
// 0
];
module ldraw_lib__389(step=0, col=false, unit=2/5, alt=false, line=0.2, solid=!$preview)
    makepoly(ldraw_lib__389(solid), step=step, col=col, unit=unit, alt=alt, line=line, solid=solid);
ldraw_lib__389(line=0.2);
